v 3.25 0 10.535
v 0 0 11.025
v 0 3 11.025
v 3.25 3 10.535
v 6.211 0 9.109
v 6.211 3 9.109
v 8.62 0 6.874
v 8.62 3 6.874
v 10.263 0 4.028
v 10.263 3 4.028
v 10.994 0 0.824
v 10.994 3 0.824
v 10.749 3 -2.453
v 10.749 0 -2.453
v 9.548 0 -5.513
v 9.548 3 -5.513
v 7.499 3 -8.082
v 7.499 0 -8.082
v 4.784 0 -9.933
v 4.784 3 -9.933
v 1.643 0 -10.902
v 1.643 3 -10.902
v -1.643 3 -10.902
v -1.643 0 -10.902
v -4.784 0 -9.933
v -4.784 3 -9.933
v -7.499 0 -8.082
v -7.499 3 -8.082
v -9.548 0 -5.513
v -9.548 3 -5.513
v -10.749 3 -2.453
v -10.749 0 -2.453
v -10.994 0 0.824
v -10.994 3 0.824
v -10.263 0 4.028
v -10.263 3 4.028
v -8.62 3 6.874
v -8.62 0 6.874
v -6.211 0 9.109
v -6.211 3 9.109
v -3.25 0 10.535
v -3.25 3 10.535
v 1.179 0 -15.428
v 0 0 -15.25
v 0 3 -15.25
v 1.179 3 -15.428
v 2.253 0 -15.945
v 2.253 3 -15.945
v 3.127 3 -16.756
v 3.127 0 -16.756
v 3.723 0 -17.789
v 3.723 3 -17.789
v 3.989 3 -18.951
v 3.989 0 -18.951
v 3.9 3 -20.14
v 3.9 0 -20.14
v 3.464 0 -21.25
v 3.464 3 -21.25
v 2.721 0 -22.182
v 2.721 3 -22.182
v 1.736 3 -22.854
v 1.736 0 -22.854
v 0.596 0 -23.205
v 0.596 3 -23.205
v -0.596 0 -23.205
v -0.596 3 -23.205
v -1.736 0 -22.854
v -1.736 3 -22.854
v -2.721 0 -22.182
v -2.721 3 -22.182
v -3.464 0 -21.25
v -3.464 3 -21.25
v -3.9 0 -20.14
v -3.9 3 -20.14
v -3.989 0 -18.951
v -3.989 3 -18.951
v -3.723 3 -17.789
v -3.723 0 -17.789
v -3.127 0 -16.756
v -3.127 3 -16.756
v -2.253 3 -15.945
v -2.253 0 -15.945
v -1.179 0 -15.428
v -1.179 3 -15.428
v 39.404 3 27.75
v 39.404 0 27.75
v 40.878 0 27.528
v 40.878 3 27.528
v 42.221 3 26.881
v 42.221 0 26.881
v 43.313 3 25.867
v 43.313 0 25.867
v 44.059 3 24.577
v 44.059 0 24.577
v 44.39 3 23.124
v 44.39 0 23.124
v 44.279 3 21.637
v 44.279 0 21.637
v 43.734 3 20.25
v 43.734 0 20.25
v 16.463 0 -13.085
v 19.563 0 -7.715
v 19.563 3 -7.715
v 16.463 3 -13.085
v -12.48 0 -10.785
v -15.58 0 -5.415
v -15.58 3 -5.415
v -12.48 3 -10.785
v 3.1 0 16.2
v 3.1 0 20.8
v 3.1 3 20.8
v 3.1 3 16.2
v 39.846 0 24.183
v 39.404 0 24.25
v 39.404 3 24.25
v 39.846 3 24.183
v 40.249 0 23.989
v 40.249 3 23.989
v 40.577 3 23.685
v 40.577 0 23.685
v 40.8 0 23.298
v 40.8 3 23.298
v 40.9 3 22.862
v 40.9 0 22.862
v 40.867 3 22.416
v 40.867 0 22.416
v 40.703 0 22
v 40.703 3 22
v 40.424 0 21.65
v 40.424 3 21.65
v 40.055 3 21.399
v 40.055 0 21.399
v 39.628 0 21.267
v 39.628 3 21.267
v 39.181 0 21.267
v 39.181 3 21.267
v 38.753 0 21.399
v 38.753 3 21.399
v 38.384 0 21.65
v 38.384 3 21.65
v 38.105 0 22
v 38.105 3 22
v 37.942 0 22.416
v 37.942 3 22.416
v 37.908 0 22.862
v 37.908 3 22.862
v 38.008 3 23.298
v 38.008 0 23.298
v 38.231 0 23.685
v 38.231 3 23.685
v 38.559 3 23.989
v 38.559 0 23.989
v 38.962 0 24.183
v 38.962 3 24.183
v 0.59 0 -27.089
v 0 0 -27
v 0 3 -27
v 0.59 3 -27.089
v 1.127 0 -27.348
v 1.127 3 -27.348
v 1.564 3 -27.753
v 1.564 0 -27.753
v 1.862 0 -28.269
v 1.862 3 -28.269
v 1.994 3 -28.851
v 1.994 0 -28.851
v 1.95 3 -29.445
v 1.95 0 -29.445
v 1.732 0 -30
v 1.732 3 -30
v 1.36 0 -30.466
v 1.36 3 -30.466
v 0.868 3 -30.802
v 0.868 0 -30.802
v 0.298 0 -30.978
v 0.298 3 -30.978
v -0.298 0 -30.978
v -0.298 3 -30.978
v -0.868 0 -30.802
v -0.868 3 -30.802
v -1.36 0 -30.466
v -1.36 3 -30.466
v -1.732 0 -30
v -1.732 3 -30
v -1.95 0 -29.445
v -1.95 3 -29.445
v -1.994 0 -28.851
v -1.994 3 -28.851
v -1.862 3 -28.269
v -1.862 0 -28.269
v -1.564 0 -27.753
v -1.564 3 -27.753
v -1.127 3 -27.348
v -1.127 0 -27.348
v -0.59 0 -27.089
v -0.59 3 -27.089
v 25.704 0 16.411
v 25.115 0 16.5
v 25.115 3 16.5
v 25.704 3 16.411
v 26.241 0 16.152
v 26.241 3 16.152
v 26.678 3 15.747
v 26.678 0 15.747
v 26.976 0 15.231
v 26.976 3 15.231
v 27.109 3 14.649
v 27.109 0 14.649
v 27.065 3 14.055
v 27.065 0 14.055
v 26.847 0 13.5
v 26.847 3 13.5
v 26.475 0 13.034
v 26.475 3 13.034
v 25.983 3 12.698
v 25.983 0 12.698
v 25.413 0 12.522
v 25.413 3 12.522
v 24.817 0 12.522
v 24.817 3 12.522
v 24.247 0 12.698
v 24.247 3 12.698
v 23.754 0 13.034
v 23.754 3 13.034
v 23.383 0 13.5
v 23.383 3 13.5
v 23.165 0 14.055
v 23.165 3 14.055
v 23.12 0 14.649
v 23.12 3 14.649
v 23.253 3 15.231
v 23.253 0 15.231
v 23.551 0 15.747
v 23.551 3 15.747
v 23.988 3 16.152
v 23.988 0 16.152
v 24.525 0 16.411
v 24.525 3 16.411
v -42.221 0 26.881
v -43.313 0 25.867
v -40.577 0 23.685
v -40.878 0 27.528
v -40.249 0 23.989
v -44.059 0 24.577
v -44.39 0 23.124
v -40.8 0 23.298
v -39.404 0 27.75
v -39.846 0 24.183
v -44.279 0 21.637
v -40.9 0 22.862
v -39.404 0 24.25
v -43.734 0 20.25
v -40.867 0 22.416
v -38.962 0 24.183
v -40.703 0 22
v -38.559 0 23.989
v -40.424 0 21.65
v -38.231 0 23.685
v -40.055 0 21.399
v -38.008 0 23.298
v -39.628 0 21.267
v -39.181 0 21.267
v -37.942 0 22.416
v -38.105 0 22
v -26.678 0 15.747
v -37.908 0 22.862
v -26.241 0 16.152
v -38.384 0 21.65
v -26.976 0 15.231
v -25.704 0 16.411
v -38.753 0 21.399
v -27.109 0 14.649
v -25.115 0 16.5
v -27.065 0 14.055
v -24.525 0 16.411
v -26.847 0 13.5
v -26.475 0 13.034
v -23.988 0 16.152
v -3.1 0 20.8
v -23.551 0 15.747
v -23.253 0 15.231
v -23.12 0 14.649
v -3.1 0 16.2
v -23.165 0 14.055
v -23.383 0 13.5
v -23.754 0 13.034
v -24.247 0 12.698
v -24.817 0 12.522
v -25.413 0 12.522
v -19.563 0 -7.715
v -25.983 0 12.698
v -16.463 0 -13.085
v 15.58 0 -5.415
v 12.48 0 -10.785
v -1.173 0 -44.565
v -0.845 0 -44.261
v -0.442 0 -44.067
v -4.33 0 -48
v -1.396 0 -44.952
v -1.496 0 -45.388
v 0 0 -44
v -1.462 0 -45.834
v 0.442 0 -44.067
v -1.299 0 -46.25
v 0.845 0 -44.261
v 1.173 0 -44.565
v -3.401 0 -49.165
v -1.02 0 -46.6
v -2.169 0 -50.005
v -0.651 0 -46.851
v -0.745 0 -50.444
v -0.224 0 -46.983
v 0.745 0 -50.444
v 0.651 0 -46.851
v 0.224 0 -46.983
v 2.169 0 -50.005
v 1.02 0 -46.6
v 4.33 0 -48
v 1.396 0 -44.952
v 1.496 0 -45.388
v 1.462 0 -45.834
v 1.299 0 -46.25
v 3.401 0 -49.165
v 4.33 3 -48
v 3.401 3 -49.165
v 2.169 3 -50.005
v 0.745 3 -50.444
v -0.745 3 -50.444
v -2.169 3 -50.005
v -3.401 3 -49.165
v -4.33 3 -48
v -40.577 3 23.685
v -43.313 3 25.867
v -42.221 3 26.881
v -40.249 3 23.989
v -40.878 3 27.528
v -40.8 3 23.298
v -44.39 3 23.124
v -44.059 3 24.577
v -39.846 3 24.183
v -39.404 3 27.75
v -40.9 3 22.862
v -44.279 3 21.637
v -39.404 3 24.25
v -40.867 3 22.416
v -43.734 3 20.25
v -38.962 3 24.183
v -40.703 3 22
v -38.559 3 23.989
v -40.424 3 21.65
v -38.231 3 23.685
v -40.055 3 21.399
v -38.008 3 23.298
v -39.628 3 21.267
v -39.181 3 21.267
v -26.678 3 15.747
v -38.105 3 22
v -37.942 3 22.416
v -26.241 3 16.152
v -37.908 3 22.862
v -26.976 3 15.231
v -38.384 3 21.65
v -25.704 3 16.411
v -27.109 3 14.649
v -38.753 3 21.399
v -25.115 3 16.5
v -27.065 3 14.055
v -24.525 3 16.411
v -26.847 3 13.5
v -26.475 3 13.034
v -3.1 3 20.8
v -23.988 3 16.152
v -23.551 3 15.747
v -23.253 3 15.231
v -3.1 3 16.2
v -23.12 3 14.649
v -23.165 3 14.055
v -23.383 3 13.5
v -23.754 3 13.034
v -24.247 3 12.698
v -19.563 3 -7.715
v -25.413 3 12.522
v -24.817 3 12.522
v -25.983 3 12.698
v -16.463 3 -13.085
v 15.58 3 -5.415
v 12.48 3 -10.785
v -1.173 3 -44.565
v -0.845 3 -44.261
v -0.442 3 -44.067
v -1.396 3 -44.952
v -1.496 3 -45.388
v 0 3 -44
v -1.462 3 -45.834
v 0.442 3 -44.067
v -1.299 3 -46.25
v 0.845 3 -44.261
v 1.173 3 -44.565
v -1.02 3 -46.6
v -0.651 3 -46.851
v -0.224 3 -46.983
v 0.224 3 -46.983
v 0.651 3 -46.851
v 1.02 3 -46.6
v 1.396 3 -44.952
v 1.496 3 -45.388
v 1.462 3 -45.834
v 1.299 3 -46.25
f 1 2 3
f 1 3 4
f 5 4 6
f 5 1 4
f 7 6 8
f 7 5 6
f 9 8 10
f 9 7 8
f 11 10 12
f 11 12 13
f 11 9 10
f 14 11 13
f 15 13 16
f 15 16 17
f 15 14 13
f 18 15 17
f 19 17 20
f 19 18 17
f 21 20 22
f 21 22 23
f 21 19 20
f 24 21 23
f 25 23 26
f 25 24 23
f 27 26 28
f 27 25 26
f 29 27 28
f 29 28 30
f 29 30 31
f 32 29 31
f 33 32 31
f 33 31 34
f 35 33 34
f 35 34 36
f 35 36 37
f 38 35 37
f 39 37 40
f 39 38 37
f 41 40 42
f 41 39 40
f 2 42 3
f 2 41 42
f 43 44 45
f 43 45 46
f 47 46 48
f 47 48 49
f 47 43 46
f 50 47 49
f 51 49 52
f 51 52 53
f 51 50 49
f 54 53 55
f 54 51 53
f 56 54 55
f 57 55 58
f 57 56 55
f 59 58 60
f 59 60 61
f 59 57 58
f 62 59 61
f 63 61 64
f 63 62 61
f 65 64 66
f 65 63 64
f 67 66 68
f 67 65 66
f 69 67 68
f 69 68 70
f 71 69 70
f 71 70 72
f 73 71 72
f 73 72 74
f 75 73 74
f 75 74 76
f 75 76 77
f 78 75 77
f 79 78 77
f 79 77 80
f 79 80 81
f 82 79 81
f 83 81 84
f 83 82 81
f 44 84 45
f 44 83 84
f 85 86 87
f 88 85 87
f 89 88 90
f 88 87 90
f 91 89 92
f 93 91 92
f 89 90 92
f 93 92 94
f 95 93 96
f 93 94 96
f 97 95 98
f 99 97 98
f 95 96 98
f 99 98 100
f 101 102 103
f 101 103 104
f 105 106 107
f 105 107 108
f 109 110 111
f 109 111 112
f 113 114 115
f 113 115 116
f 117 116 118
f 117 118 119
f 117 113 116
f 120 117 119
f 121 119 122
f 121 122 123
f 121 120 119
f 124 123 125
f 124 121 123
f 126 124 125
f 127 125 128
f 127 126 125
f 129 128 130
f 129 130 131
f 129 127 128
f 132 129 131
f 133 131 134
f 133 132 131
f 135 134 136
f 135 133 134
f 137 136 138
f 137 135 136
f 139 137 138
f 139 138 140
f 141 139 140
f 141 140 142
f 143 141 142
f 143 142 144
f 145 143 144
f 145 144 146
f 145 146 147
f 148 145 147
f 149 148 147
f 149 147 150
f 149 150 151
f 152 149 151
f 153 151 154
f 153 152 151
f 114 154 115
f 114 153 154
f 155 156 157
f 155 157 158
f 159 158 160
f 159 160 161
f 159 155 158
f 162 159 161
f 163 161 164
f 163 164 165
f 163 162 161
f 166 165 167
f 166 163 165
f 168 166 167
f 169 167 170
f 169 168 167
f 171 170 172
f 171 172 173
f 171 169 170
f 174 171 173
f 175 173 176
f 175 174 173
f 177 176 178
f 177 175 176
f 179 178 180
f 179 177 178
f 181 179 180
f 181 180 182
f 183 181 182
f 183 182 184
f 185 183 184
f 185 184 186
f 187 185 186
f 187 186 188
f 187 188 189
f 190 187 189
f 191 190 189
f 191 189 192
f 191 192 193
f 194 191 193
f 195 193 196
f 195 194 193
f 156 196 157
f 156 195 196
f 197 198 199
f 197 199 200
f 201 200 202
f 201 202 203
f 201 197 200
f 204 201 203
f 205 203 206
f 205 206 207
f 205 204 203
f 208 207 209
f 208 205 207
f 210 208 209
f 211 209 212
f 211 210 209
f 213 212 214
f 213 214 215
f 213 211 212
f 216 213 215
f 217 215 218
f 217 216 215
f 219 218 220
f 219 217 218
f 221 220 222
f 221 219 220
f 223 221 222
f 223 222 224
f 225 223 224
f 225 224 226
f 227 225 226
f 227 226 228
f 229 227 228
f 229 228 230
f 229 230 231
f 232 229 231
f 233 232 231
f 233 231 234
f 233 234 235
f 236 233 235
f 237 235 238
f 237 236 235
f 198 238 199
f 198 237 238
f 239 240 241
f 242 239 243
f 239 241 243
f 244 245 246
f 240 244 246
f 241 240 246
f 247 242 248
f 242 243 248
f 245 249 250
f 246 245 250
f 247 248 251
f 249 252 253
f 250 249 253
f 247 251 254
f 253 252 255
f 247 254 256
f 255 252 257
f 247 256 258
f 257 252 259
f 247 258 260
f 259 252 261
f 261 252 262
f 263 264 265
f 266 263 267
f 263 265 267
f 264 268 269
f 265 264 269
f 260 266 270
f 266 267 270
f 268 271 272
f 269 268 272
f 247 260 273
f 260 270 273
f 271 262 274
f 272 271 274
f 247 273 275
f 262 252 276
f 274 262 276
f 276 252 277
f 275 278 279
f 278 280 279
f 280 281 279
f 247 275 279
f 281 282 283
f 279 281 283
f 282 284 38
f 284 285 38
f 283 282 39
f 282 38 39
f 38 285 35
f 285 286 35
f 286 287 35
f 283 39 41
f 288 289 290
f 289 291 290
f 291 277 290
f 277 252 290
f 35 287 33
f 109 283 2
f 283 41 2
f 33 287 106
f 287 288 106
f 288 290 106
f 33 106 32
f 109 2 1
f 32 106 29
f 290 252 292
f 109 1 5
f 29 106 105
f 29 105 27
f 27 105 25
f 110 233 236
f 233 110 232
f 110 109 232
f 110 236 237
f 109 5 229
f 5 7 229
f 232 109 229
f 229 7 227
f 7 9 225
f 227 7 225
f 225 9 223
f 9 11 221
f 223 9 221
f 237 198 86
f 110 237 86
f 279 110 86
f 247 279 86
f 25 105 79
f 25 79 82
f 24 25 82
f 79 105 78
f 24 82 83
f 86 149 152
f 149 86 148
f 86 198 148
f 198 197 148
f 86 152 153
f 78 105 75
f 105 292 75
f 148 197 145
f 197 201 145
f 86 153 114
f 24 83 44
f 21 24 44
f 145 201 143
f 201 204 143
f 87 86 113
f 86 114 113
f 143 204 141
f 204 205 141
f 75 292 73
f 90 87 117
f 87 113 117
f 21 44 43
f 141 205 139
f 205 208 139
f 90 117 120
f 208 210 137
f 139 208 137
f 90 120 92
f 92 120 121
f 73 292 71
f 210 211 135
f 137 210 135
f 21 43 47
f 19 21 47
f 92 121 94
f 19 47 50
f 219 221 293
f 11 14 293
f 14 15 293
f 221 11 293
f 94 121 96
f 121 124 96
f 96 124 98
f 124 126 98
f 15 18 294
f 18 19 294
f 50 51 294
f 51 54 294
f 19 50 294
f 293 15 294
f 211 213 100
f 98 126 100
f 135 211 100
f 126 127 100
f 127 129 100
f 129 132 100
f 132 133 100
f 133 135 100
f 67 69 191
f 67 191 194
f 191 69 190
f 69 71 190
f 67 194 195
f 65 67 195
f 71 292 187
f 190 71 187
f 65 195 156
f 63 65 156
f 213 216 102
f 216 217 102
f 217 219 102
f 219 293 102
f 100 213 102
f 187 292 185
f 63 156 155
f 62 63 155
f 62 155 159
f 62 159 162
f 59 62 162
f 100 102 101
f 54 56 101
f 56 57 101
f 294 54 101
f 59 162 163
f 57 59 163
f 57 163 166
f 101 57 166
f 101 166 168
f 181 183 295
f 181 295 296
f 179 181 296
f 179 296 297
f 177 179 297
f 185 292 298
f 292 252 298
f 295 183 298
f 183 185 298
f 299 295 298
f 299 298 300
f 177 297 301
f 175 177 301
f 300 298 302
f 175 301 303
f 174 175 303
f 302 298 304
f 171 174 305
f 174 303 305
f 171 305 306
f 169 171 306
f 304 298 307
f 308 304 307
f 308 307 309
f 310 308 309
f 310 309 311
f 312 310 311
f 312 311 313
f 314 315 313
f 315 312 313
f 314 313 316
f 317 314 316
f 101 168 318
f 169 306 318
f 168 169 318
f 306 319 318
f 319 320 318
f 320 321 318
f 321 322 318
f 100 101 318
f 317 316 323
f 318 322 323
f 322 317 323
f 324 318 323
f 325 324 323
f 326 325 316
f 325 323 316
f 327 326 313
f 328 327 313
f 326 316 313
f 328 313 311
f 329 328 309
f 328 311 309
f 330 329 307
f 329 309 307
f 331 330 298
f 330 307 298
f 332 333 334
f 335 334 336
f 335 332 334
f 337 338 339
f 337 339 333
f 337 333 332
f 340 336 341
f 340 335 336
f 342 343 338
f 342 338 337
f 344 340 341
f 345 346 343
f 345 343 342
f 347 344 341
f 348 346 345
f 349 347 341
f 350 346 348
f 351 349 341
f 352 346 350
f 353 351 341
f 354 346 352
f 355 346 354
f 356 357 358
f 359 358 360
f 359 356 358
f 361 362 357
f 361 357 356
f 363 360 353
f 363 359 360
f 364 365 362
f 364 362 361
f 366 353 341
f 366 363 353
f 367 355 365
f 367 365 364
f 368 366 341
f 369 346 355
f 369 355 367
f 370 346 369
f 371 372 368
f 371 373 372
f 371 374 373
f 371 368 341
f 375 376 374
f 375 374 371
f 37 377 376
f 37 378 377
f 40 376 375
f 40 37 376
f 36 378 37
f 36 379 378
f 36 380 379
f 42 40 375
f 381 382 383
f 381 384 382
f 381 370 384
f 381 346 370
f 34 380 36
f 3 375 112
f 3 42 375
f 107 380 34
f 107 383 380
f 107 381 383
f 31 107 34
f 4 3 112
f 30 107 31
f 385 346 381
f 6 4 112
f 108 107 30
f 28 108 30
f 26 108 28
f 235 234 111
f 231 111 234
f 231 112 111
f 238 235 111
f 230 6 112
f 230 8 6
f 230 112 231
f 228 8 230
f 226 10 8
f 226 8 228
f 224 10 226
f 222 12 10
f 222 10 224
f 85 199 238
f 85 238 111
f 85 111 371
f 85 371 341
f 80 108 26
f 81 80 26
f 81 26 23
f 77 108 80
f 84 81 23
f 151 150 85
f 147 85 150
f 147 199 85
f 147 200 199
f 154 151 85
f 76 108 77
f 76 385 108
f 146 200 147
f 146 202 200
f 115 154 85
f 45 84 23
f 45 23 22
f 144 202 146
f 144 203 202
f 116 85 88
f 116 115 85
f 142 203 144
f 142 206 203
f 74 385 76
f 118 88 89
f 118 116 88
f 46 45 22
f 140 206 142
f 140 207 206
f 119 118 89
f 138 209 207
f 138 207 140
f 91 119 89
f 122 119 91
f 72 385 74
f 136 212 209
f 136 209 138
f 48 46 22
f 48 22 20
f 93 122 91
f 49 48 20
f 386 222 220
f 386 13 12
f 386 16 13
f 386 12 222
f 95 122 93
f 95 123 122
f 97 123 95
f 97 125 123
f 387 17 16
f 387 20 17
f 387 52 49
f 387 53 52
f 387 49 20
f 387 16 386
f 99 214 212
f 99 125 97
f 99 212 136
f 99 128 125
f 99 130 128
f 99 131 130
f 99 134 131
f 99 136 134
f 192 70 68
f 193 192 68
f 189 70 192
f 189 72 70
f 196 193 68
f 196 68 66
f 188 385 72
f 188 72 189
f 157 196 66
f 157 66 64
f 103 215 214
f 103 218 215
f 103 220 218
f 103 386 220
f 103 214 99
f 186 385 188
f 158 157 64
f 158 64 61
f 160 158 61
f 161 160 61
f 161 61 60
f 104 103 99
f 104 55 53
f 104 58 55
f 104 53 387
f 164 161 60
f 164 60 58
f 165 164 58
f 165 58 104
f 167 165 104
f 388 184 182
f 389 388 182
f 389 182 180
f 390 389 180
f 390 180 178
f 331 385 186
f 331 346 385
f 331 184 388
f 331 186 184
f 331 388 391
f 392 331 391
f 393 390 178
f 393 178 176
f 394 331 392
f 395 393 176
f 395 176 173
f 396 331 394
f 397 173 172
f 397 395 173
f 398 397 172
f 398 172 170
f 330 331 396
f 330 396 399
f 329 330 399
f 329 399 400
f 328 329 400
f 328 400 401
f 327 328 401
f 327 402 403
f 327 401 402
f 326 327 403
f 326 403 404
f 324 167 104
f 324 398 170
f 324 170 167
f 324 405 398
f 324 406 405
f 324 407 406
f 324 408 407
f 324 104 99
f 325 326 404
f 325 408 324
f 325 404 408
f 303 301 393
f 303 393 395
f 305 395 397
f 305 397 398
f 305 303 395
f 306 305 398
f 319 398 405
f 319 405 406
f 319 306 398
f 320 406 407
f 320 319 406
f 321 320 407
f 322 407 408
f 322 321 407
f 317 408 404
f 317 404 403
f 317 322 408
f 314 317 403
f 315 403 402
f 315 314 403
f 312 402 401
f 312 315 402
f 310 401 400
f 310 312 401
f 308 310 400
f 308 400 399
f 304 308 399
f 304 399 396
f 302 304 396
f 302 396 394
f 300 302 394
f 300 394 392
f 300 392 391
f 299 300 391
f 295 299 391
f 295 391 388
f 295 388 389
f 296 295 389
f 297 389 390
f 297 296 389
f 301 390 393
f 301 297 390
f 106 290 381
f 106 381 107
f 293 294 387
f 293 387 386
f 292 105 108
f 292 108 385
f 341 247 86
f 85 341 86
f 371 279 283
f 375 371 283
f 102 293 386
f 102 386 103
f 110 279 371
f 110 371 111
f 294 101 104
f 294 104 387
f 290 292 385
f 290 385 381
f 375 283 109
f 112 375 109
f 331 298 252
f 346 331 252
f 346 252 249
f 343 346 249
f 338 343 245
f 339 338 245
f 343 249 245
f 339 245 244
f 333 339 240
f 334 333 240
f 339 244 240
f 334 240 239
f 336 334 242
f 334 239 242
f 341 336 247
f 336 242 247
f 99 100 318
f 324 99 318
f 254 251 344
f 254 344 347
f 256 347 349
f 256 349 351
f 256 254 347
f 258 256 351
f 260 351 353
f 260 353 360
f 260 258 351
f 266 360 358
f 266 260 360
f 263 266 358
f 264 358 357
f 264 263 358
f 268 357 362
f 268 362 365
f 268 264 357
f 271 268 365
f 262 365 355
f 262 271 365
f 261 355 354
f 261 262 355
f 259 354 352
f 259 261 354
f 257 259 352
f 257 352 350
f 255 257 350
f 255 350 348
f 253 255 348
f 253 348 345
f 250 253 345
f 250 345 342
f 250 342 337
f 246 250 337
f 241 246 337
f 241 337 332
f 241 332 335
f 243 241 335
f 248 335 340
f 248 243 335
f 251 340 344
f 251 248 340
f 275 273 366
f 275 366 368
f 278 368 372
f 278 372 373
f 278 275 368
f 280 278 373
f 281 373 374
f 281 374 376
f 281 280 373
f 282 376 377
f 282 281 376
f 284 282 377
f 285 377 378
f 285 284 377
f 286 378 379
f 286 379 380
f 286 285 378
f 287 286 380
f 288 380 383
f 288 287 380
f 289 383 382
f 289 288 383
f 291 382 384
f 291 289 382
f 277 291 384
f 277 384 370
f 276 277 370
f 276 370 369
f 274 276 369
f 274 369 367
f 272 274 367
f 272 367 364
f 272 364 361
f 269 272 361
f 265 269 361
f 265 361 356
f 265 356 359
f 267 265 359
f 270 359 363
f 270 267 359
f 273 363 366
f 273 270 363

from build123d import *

# Parameters (mm, degrees)
SKETCH_1_R      = 11.025
SKETCH_1_R_2    = 1.5
SKETCH_1_R_3    = 2
SKETCH_1_R_4    = 4
SKETCH_1_W      = 6.2
SKETCH_1_H      = 4.6
EXTRUDE_1_DEPTH = 3


with BuildPart() as part:
    # 草图1 → 凸台-拉伸1 (new body)
    with BuildSketch(Plane(origin=(0, 0, 0), x_dir=(1, 0, 0), z_dir=(0, 1, 0))):
        with BuildLine():
            Line((-4.330127019, 48), (-43.734282891, -20.25))
            ThreePointArc((-43.734282891, -20.25), (-43.734282891, -25.25), (-39.404155872, -27.75))
            Line((-39.404155872, -27.75), (39.404155872, -27.75))
            ThreePointArc((39.404155872, -27.75), (43.734282891, -25.25), (43.734282891, -20.25))
            Line((43.734282891, -20.25), (4.330127019, 48))
            ThreePointArc((4.330127019, 48), (0, 50.5), (-4.330127019, 48))
        make_face()
        with Locations(Location((0, 0, 0), (0, 0, 270))):
            Circle(SKETCH_1_R, mode=Mode.SUBTRACT)
        with Locations(Location((0, 45.5, 0), (0, 0, 270))):
            Circle(SKETCH_1_R_2, mode=Mode.SUBTRACT)
        with Locations(Location((39.404155872, -22.75, 0), (0, 0, 270))):
            Circle(SKETCH_1_R_2, mode=Mode.SUBTRACT)
        with Locations(Location((-39.404155872, -22.75, 0), (0, 0, 270))):
            Circle(SKETCH_1_R_2, mode=Mode.SUBTRACT)
        with Locations(Location((0, 29, 0), (0, 0, 270))):
            Circle(SKETCH_1_R_3, mode=Mode.SUBTRACT)
        with Locations(Location((25.11473671, -14.5, 0), (0, 0, 270))):
            Circle(SKETCH_1_R_3, mode=Mode.SUBTRACT)
        with Locations(Location((-25.11473671, -14.5, 0), (0, 0, 270))):
            Circle(SKETCH_1_R_3, mode=Mode.SUBTRACT)
        with Locations(Location((0, 19.25, 0), (0, 0, 270))):
            Circle(SKETCH_1_R_4, mode=Mode.SUBTRACT)
        Polygon((-12.479611541, 10.784678752), (-16.463328399, 13.084678752), (-19.563328399, 7.715321248), (-15.579611541, 5.415321248), align=None, mode=Mode.SUBTRACT)
        with Locations((0, -18.5)):
            Rectangle(SKETCH_1_W, SKETCH_1_H, mode=Mode.SUBTRACT)
        Polygon((15.579611541, 5.415321248), (19.563328399, 7.715321248), (16.463328399, 13.084678752), (12.479611541, 10.784678752), align=None, mode=Mode.SUBTRACT)
    extrude(amount=EXTRUDE_1_DEPTH)


solid = part.part
